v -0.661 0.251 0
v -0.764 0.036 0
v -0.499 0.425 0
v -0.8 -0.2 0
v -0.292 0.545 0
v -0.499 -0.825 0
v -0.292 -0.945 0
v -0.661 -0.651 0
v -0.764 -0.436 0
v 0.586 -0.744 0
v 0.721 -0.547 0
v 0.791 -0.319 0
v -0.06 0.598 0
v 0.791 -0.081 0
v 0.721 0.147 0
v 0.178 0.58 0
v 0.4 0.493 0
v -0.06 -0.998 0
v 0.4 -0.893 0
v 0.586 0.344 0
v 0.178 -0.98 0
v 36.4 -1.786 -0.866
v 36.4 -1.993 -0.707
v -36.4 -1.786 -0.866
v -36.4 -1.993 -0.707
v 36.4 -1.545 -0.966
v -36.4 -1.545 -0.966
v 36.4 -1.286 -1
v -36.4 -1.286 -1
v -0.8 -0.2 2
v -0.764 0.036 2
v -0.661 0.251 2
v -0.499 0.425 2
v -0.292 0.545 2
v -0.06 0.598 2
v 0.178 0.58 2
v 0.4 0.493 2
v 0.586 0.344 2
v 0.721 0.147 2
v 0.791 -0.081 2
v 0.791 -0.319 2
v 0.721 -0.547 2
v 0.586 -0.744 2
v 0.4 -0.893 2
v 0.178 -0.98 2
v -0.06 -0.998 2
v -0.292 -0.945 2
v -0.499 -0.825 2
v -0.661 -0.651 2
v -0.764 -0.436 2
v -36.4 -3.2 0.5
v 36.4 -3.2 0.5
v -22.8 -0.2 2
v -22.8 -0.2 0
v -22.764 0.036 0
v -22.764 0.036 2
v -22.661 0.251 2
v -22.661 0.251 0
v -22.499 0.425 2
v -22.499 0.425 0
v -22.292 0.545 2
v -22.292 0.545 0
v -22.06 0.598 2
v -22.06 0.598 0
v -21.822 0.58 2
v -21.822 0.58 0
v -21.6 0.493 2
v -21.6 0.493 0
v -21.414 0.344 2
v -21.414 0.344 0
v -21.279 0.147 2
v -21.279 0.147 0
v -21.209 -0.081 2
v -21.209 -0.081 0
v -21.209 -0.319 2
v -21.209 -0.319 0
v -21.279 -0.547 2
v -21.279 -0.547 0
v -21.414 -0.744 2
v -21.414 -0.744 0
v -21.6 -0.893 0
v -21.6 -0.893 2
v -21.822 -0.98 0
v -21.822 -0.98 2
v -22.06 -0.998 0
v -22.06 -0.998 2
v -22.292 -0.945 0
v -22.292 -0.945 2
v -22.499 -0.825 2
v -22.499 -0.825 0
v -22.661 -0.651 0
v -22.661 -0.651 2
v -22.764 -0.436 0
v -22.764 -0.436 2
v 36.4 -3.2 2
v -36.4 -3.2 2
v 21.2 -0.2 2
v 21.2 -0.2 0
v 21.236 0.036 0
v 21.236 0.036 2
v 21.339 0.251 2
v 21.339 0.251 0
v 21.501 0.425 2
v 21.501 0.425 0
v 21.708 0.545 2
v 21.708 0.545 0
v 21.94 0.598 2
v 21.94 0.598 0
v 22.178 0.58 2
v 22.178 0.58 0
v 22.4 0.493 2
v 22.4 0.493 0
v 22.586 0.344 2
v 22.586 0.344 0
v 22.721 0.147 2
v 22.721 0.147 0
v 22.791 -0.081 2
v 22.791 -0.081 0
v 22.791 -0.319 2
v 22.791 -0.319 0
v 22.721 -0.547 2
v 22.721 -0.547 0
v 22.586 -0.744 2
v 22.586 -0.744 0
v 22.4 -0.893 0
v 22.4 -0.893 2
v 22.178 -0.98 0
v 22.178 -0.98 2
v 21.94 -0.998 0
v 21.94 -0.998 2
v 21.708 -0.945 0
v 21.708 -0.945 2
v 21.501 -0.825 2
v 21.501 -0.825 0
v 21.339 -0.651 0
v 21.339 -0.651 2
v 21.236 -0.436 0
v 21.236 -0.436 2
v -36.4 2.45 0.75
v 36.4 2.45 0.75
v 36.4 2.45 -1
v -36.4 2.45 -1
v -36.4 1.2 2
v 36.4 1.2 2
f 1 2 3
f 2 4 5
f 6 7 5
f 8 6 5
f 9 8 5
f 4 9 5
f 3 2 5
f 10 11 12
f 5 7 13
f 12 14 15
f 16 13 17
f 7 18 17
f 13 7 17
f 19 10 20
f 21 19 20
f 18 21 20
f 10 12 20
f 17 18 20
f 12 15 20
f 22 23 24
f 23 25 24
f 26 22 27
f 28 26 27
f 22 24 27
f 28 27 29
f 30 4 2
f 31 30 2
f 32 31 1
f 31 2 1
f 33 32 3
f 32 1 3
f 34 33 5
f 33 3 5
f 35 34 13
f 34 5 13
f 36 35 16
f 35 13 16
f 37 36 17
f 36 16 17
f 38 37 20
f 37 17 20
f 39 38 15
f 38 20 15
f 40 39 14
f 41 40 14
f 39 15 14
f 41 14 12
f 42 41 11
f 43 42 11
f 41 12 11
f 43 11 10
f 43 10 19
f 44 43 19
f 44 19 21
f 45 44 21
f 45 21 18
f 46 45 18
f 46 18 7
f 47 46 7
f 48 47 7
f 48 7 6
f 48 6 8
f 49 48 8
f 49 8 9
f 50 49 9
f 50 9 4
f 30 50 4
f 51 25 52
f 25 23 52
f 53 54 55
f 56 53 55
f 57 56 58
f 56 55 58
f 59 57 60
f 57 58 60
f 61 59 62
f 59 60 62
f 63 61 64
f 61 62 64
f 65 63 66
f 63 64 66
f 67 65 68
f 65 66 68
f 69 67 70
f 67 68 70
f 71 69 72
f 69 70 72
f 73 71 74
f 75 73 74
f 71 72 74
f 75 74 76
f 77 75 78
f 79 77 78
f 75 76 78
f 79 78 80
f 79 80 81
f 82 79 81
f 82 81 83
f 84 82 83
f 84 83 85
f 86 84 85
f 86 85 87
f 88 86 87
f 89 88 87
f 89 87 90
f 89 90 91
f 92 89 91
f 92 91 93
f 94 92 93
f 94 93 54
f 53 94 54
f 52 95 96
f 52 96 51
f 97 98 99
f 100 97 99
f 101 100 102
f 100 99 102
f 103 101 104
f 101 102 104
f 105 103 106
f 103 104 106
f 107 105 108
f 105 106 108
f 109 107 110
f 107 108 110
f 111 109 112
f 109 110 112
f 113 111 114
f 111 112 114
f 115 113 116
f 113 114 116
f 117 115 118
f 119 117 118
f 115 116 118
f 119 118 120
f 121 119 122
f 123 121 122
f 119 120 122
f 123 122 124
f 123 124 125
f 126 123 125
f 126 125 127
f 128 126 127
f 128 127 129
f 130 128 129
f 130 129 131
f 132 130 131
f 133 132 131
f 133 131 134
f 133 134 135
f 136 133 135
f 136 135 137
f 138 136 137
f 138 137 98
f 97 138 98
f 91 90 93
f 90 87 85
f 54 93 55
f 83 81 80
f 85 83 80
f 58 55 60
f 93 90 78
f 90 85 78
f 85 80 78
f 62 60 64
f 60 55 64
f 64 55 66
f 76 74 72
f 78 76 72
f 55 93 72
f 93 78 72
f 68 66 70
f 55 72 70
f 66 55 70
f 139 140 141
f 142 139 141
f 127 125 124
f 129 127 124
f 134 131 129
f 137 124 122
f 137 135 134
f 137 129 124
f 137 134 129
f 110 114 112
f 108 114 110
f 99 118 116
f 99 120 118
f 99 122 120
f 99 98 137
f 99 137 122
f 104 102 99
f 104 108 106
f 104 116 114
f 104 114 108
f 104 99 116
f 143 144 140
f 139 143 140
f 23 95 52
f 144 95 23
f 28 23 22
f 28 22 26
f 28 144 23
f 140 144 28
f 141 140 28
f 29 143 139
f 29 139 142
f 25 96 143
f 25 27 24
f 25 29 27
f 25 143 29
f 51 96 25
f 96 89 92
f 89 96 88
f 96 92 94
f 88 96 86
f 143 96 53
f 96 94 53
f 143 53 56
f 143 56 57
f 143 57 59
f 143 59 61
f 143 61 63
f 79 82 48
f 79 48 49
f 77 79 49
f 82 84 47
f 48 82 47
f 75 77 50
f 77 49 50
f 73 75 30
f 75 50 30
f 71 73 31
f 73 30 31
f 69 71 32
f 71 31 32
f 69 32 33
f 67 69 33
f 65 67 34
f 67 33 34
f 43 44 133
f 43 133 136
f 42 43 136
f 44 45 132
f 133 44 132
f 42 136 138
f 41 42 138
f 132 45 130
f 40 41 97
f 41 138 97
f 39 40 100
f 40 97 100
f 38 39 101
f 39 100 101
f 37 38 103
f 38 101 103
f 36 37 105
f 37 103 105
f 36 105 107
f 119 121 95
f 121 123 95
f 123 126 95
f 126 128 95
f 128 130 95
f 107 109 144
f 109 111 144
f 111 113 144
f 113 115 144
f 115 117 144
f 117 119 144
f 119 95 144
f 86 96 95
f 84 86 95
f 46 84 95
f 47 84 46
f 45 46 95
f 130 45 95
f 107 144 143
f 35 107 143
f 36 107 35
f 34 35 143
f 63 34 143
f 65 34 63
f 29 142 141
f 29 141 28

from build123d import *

# Parameters (mm, degrees)
SKETCH1_W                       = 2
SKETCH1_H                       = 6.4
BOSS_EXTRUDE1_DEPTH             = 36.4
CUT_EXTRUDE8_DEPTH              = 37.595081637
CUT_EXTRUDE8_DEPTH_BACK         = 37.595081637
SKETCH15_W                      = 2
SKETCH15_H                      = 0.75
CUT_EXTRUDE5_DEPTH              = 72.8
M2X0_4_TAPPED_HOLE1_D           = 1.6
M2X0_4_TAPPED_HOLE1_DEPTH       = 3.6
M2X0_4_TAPPED_HOLE1_TIP         = 0.480688495
CUT_EXTRUDE9_DEPTH              = 37.595081637
CUT_EXTRUDE9_DEPTH_BACK         = 37.595081637
BOSS_EXTRUDE8_REACH             = 38.595
BOSS_EXTRUDE8_DIRECTION_2_REACH = 38.595
FILLET7_R                       = 1


with BuildPart() as part:
    # Sketch1 → Boss-Extrude1 (new, symmetric)
    with BuildSketch(Plane(origin=(0, 0, 0), x_dir=(0, 0, -1), z_dir=(1, 0, 0))):
        with Locations((-1, 0)):
            Rectangle(SKETCH1_W, SKETCH1_H)
    extrude(amount=BOSS_EXTRUDE1_DEPTH, both=True)

    # Sketch15 → Cut-Extrude8 (cut, two sides: drawn at the far end of the back side and taken through both)
    with BuildSketch(Plane(origin=(0, 0, 0), x_dir=(0, 0, -1), z_dir=(1, 0, 0)).offset(-CUT_EXTRUDE8_DEPTH_BACK)):
        with Locations((-1, 2.825)):
            Rectangle(SKETCH15_W, SKETCH15_H)
    extrude(amount=CUT_EXTRUDE8_DEPTH + CUT_EXTRUDE8_DEPTH_BACK, mode=Mode.SUBTRACT)

    # Sketch5 → Cut-Extrude5 (cut)
    with BuildSketch(Plane.ZY.offset(36.4)):
        Polygon((0, -3.2), (0.5, -3.2), (0, -2.7), align=None)
    extrude(amount=-CUT_EXTRUDE5_DEPTH, mode=Mode.SUBTRACT)

    # M2x0.4 Tapped Hole1
    with Locations(Plane.XY.offset(2)):
        with Locations((-22, -0.2), (22, -0.2), (0, -0.2)):
            Hole(M2X0_4_TAPPED_HOLE1_D / 2, depth=M2X0_4_TAPPED_HOLE1_DEPTH)
            with Locations((0, 0, -(M2X0_4_TAPPED_HOLE1_DEPTH + M2X0_4_TAPPED_HOLE1_TIP / 2))):  # 118° drill point
                Cone(0, M2X0_4_TAPPED_HOLE1_D / 2, M2X0_4_TAPPED_HOLE1_TIP, mode=Mode.SUBTRACT)

    # Sketch16 → Cut-Extrude9 (cut, two sides: drawn at the far end of the back side and taken through both)
    with BuildSketch(Plane(origin=(0, 0, 0), x_dir=(0, 0, -1), z_dir=(1, 0, 0)).offset(-CUT_EXTRUDE9_DEPTH_BACK)):
        Polygon((0, 3.2), (-2, 3.2), (-2, 1.2), align=None)
    extrude(amount=CUT_EXTRUDE9_DEPTH + CUT_EXTRUDE9_DEPTH_BACK, mode=Mode.SUBTRACT)

    # Boss-Extrude8: up to this face of the body (flat: up to its plane)
    boss_extrude8_end = Plane(part.part.faces().sort_by_distance((36.4, -0.524052916, 0.966175586))[0])
    # Sketch17 → Boss-Extrude8 (add, up to the picked face)
    with BuildSketch(Plane(origin=(0, 0, 0), x_dir=(0, 0, -1), z_dir=(1, 0, 0)), mode=Mode.PRIVATE) as boss_extrude8_sk1:
        Polygon((0, 2.45), (1, 2.45), (1, -1.7), (0, -2.7), align=None)
    boss_extrude8_tool1 = split(extrude(boss_extrude8_sk1.sketch, amount=BOSS_EXTRUDE8_REACH, mode=Mode.PRIVATE), bisect_by=boss_extrude8_end, keep=Keep.BOTH, mode=Mode.PRIVATE)
    add(boss_extrude8_tool1.solids().sort_by(Axis((0, 0.116039, -0.482079), (1, 0, 0)))[0])

    # Boss-Extrude8 direction 2: up to this face of the body (flat: up to its plane)
    boss_extrude8_direction_2_end = Plane(part.part.faces().sort_by_distance((-36.4, -0.524052916, 0.966175586))[0])
    # Sketch17 → Boss-Extrude8 direction 2 (add, up to the picked face)
    with BuildSketch(Plane(origin=(0, 0, 0), x_dir=(0, 0, -1), z_dir=(1, 0, 0)), mode=Mode.PRIVATE) as boss_extrude8_direction_2_sk1:
        Polygon((0, 2.45), (1, 2.45), (1, -1.7), (0, -2.7), align=None)
    boss_extrude8_direction_2_tool1 = split(extrude(boss_extrude8_direction_2_sk1.sketch, amount=-BOSS_EXTRUDE8_DIRECTION_2_REACH, mode=Mode.PRIVATE), bisect_by=boss_extrude8_direction_2_end, keep=Keep.BOTH, mode=Mode.PRIVATE)
    add(boss_extrude8_direction_2_tool1.solids().sort_by(Axis((0, 0.116039, -0.482079), (-1, 0, 0)))[0])

    # Fillet7
    fillet7_edges = [part.edges().sort_by_distance(p)[0] for p in [
        (0, -1.7, -1),
    ]]
    fillet(fillet7_edges, radius=FILLET7_R)


solid = part.part
